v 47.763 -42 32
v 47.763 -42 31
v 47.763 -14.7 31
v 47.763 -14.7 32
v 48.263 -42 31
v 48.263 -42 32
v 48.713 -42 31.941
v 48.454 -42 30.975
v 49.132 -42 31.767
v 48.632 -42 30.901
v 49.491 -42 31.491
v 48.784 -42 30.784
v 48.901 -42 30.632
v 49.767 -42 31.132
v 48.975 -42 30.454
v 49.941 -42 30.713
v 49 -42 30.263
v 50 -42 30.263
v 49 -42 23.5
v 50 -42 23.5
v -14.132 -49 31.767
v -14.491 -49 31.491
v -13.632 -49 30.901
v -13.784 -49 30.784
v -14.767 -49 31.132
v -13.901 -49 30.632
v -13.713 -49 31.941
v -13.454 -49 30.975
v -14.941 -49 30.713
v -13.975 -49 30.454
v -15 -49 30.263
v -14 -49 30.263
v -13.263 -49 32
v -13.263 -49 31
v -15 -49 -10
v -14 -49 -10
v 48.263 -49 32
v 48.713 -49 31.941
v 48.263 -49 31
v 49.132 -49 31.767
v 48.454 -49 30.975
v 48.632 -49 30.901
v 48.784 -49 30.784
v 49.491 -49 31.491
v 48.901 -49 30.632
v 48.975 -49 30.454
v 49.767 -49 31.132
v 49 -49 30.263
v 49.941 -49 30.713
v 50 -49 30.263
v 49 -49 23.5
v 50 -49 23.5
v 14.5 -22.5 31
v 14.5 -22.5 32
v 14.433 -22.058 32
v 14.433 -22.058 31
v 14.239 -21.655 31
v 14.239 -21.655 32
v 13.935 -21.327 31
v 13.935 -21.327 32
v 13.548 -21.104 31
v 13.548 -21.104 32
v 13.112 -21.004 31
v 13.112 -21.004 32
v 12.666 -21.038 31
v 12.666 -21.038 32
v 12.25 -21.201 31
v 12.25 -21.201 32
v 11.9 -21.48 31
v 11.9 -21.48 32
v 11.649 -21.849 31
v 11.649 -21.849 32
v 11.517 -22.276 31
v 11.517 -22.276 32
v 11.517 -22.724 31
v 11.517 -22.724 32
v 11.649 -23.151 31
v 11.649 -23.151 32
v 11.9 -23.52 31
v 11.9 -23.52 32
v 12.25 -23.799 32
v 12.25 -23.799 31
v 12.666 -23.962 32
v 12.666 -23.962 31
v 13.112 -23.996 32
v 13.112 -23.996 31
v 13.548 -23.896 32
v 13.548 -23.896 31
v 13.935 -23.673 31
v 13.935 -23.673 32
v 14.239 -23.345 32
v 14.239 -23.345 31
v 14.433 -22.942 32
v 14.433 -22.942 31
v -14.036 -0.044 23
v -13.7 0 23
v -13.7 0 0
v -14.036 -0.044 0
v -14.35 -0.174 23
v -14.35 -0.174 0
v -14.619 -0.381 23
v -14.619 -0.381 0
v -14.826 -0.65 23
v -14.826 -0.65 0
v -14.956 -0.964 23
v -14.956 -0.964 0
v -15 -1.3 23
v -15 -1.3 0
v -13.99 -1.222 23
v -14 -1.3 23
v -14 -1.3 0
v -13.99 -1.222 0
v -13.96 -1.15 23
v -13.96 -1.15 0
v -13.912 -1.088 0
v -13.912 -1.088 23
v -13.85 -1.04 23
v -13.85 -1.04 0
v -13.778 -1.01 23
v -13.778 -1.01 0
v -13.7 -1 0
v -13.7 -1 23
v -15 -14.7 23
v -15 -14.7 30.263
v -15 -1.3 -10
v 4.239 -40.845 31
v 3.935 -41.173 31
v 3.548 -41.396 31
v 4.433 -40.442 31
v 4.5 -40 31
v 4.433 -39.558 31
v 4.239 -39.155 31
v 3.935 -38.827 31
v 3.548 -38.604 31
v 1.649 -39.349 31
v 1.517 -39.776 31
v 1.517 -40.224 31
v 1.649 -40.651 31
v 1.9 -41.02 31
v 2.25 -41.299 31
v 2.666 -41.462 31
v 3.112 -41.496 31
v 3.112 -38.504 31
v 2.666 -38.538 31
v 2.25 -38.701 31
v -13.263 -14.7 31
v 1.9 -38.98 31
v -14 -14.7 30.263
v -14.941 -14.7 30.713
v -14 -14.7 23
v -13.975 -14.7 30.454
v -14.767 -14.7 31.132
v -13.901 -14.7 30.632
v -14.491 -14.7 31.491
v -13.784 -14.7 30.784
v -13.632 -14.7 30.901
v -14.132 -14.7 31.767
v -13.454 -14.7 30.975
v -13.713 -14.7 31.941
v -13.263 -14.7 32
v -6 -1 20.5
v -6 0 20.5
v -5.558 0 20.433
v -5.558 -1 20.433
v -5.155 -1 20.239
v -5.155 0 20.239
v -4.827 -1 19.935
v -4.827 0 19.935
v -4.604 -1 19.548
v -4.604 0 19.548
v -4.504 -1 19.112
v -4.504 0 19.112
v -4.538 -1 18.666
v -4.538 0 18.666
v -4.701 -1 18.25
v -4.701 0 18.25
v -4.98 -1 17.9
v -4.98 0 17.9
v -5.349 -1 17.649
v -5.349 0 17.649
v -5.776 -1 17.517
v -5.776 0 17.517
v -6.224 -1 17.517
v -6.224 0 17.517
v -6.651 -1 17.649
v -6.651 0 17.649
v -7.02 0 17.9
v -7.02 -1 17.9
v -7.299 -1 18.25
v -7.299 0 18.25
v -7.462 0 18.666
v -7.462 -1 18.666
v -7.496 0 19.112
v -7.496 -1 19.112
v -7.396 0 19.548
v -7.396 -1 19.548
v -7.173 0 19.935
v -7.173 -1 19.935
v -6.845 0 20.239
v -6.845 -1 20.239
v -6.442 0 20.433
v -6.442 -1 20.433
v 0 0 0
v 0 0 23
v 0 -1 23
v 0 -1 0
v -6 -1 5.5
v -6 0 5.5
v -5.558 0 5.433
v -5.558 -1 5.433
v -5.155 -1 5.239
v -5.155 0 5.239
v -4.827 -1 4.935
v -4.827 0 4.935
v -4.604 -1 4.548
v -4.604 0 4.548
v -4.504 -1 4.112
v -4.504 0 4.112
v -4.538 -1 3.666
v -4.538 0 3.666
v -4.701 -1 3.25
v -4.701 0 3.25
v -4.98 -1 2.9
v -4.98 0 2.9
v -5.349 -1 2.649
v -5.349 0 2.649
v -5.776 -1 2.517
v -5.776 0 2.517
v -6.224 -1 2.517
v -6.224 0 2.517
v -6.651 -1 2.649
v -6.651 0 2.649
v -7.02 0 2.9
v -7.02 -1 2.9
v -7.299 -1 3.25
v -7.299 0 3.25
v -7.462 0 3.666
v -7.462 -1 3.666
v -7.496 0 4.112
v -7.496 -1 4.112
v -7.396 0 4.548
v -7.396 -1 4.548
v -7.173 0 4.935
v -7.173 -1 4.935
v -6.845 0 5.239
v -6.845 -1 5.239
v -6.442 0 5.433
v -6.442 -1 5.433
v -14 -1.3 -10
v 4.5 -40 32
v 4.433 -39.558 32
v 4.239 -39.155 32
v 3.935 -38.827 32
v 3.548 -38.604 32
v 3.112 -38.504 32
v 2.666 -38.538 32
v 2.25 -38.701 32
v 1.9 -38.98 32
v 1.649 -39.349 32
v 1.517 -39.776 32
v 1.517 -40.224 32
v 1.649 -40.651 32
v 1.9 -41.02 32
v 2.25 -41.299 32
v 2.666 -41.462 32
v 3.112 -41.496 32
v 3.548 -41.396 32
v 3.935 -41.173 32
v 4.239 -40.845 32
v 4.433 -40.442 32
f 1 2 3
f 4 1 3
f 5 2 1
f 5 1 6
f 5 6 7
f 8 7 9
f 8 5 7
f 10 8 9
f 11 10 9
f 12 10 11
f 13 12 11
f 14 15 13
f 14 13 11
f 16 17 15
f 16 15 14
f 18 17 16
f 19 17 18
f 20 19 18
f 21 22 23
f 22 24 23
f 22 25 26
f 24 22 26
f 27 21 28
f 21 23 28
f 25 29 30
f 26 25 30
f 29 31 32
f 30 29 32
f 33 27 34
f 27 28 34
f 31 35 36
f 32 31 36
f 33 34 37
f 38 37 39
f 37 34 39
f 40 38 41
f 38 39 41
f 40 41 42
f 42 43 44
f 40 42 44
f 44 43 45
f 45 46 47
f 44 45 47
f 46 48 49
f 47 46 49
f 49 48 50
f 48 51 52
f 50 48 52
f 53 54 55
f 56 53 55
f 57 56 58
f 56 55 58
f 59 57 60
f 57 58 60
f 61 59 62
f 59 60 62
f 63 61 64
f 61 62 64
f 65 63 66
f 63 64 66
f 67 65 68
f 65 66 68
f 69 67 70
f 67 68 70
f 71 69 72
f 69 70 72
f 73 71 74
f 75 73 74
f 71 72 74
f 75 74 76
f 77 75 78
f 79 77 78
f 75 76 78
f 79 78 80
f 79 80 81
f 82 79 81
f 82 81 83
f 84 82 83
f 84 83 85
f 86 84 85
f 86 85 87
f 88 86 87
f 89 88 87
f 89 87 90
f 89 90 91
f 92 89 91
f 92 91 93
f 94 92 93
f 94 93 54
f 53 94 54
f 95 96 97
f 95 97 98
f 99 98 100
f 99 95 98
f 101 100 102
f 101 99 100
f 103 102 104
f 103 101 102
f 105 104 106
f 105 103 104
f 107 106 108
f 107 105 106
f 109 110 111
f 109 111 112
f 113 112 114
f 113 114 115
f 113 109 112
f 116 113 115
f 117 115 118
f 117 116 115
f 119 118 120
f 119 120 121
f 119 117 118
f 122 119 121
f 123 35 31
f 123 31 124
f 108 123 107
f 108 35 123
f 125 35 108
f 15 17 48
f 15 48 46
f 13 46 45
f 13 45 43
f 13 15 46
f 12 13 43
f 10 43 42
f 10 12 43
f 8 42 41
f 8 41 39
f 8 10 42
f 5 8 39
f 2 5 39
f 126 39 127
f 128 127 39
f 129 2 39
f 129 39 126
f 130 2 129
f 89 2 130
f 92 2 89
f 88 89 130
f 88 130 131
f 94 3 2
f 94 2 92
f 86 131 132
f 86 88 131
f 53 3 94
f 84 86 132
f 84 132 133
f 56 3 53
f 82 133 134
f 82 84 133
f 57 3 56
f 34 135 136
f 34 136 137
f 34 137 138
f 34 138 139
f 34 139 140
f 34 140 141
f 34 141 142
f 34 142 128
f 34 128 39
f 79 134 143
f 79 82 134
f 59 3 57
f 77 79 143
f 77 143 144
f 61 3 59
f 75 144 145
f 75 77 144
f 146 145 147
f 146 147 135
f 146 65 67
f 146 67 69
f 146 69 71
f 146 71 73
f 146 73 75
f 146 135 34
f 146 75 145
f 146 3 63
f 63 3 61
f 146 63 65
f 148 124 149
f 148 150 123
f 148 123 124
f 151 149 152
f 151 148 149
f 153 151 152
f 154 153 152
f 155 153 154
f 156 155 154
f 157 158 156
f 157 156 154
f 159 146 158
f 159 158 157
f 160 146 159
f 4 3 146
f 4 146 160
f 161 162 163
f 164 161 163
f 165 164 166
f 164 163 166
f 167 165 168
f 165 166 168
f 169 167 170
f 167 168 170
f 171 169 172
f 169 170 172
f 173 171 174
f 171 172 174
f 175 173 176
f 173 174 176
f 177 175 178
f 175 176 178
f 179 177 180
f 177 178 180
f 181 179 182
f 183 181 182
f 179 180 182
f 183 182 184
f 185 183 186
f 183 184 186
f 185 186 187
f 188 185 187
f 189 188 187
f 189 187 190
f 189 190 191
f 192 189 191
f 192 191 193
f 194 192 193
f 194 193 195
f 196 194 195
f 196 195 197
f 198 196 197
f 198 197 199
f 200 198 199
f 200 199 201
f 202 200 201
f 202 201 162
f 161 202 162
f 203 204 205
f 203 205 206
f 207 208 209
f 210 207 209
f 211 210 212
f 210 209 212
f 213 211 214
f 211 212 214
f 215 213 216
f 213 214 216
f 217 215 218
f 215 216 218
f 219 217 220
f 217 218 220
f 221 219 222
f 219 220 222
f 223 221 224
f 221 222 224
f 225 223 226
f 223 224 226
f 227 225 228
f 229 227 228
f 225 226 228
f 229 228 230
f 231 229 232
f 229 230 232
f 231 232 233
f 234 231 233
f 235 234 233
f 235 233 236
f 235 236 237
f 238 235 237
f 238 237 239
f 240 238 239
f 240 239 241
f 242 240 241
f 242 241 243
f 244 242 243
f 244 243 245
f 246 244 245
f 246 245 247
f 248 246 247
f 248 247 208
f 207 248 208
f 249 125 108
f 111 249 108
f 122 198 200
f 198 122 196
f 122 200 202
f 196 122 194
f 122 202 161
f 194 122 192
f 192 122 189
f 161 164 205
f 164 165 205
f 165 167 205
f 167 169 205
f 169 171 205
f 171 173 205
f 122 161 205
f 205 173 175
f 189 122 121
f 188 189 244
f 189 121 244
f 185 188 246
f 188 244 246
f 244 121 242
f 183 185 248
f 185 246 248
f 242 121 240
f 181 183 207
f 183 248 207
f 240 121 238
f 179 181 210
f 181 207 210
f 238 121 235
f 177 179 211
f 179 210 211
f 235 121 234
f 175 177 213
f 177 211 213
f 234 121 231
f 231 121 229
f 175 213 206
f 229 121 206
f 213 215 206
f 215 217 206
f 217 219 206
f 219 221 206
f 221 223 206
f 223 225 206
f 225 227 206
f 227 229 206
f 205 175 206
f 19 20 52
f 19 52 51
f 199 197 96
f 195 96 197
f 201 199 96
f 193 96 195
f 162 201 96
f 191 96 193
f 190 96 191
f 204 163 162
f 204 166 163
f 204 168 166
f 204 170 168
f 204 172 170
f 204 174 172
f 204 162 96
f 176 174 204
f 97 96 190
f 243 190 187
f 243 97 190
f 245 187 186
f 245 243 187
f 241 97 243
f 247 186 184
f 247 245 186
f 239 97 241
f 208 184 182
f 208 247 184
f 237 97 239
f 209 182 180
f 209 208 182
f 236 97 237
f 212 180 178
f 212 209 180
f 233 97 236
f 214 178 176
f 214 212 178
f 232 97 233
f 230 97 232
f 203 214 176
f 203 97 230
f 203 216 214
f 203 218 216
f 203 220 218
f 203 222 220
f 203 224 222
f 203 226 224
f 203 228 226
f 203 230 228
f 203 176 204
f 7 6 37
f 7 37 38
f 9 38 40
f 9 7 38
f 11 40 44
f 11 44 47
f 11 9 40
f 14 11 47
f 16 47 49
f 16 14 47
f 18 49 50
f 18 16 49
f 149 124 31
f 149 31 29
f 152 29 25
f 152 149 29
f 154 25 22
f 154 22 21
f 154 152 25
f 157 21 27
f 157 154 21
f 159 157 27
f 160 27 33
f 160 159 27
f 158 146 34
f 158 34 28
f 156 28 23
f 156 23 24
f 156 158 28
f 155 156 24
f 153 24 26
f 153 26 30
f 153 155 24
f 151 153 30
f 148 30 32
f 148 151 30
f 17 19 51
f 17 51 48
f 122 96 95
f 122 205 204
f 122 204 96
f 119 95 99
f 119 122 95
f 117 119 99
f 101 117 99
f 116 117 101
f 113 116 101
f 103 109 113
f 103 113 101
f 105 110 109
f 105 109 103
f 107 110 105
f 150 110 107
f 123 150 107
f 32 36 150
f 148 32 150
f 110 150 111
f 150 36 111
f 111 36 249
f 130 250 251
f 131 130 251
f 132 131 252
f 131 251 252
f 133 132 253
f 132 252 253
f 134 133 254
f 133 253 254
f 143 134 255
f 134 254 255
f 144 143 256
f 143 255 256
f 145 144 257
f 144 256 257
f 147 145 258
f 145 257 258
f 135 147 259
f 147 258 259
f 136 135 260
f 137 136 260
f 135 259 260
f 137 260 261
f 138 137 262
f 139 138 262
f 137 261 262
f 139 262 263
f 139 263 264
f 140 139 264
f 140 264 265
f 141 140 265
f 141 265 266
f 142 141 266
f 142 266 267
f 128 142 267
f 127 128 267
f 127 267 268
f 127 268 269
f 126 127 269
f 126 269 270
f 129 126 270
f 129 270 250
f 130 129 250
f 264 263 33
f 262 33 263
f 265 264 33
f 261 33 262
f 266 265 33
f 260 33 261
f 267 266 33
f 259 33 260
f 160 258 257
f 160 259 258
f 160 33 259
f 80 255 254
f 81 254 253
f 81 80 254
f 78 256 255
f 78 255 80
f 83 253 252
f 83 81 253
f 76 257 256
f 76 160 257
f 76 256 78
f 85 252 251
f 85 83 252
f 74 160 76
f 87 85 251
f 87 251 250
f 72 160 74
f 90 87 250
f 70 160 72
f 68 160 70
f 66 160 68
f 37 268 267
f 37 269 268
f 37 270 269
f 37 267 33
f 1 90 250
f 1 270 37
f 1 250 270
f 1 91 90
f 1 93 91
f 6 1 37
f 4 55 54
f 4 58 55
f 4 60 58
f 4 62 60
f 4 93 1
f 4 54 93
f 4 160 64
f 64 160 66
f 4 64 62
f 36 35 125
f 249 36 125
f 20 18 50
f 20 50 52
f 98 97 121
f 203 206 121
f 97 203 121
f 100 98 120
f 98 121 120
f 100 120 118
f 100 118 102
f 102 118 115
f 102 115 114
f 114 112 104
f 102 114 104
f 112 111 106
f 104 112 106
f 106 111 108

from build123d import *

# Parameters (mm, degrees)
SKETCH1_W                     = 15
SKETCH1_H                     = 23
BASE_FLANGE1_DEPTH            = 1
EDGE_FLANGE1_STRIP_W          = 4.6
EDGE_FLANGE1_STRIP_H          = 1
EDGE_FLANGE1_STRIP_CUT_DEPTH  = 23
EDGE_FLANGE1_DEPTH            = 23
SKETCH10_W                    = 10
SKETCH10_H                    = 47.7
BOSS_EXTRUDE2_DEPTH           = 1
SKETCH15_W                    = 1
SKETCH15_H                    = 34.3
BOSS_EXTRUDE3_DEPTH           = 9
EDGE_FLANGE3_STRIP_W          = 5.4732
EDGE_FLANGE3_STRIP_H          = 1
EDGE_FLANGE3_STRIP_CUT_DEPTH  = 34.3
EDGE_FLANGE3_DEPTH            = 34.3
EDGE_FLANGE4_STRIP_W          = 5.4732
EDGE_FLANGE4_STRIP_H          = 1
EDGE_FLANGE4_STRIP_CUT_DEPTH  = 7
EDGE_FLANGE4_RELIEF_W         = 5.9732
EDGE_FLANGE4_RELIEF_H         = 1000
EDGE_FLANGE4_RELIEF_CUT_DEPTH = 1
EDGE_FLANGE4_DEPTH            = 7
SKETCH31_R                    = 1.5
CUT_EXTRUDE1_DEPTH            = 82.639451248
SKETCH32_R                    = 1.5
CUT_EXTRUDE2_DEPTH            = 10


# Sheet-metal steps are written as plain solids
with BuildPart() as part:
    # Sketch1 → Base-Flange1 (new body)
    with BuildSketch(Plane(origin=(0, 0, 0), x_dir=(1, 0, 0), z_dir=(0, 1, 0))):
        with Locations((-7.5, -11.5)):
            Rectangle(SKETCH1_W, SKETCH1_H)
    extrude(amount=-BASE_FLANGE1_DEPTH)

    # Edge-Flange1 strip (across the edge) → Edge-Flange1 strip cut (cut)
    with BuildSketch(Plane(origin=(-15, -1, 23), x_dir=(1, 0, 0), z_dir=(0, 0, -1))):
        with Locations((-1, -0.5)):
            Rectangle(EDGE_FLANGE1_STRIP_W, EDGE_FLANGE1_STRIP_H)
    extrude(amount=EDGE_FLANGE1_STRIP_CUT_DEPTH, mode=Mode.SUBTRACT)

    # Edge-Flange1 section (across the edge) → Edge-Flange1 (add)
    with BuildSketch(Plane(origin=(-15, -1, 23), x_dir=(1, 0, 0), z_dir=(0, 0, -1))):
        with BuildLine():
            Line((0, 0.3), (0, 48))
            Line((0, 48), (1, 48))
            Line((1, 48), (1, 0.3))
            ThreePointArc((1, 0.3), (1.087867966, 0.087867966), (1.3, 0))
            Line((1.3, 0), (1.3, -1))
            ThreePointArc((1.3, -1), (0.380761184, -0.619238816), (0, 0.3))
        make_face()
    extrude(amount=EDGE_FLANGE1_DEPTH)

    # Sketch10 → Boss-Extrude2 (add)
    with BuildSketch(Plane.ZY.offset(15)):
        with Locations((-5, -25.15)):
            Rectangle(SKETCH10_W, SKETCH10_H)
    extrude(amount=-BOSS_EXTRUDE2_DEPTH)

    # Sketch15 → Boss-Extrude3 (add)
    with BuildSketch(Plane.XY.offset(23)):
        with Locations((-14.5, -31.85)):
            Rectangle(SKETCH15_W, SKETCH15_H)
    extrude(amount=BOSS_EXTRUDE3_DEPTH)

    # Edge-Flange3 strip (across the edge) → Edge-Flange3 strip cut (cut)
    with BuildSketch(Plane(origin=(-14, -14.7, 32), x_dir=(0, 0, -1), z_dir=(0, -1, 0))):
        with Locations((-1, -0.5)):
            Rectangle(EDGE_FLANGE3_STRIP_W, EDGE_FLANGE3_STRIP_H)
    extrude(amount=EDGE_FLANGE3_STRIP_CUT_DEPTH, mode=Mode.SUBTRACT)

    # Edge-Flange3 section (across the edge) → Edge-Flange3 (add)
    with BuildSketch(Plane(origin=(-14, -14.7, 32), x_dir=(0, 0, -1), z_dir=(0, -1, 0))):
        with BuildLine():
            Line((0, 0.7366), (0, 64))
            Line((0, 64), (1, 64))
            Line((1, 64), (1, 0.7366))
            ThreePointArc((1, 0.7366), (1.215745145, 0.215745145), (1.7366, 0))
            Line((1.7366, 0), (1.7366, -1))
            ThreePointArc((1.7366, -1), (0.508638364, -0.491361636), (0, 0.7366))
        make_face()
    extrude(amount=EDGE_FLANGE3_DEPTH)

    # Edge-Flange4 strip (across the edge) → Edge-Flange4 strip cut (cut)
    with BuildSketch(Plane(origin=(50, -42, 31), x_dir=(-1, 0, 0), z_dir=(0, -1, 0))):
        with Locations((-1, -0.5)):
            Rectangle(EDGE_FLANGE4_STRIP_W, EDGE_FLANGE4_STRIP_H)
    extrude(amount=EDGE_FLANGE4_STRIP_CUT_DEPTH, mode=Mode.SUBTRACT)

    # Edge-Flange4 relief (on the sheet) → Edge-Flange4 relief cut (cut)
    with BuildSketch(Plane(origin=(48.2634, -42, 31), x_dir=(-1, 0, 0), z_dir=(0, 0, -1))):
        with Locations((-2.4866, 500)):
            Rectangle(EDGE_FLANGE4_RELIEF_W, EDGE_FLANGE4_RELIEF_H)
    extrude(amount=-EDGE_FLANGE4_RELIEF_CUT_DEPTH, mode=Mode.SUBTRACT)

    # Edge-Flange4 section (across the edge) → Edge-Flange4 (add)
    with BuildSketch(Plane(origin=(50, -42, 31), x_dir=(-1, 0, 0), z_dir=(0, -1, 0))):
        with BuildLine():
            Line((0, 0.7366), (0, 7.5))
            Line((0, 7.5), (1, 7.5))
            Line((1, 7.5), (1, 0.7366))
            ThreePointArc((1, 0.7366), (1.215745145, 0.215745145), (1.7366, 0))
            Line((1.7366, 0), (1.7366, -1))
            ThreePointArc((1.7366, -1), (0.508638364, -0.491361636), (0, 0.7366))
        make_face()
    extrude(amount=EDGE_FLANGE4_DEPTH)

    # Sketch31 → Cut-Extrude1 (cut, through all)
    with BuildSketch(Plane.XY.offset(32)):
        with Locations((3, -40)):
            Circle(SKETCH31_R)
        with Locations((13, -22.5)):
            Circle(SKETCH31_R)
    extrude(amount=-CUT_EXTRUDE1_DEPTH, mode=Mode.SUBTRACT)

    # Sketch32 → Cut-Extrude2 (cut)
    with BuildSketch(Plane(origin=(0, 0, 0), x_dir=(1, 0, 0), z_dir=(0, 1, 0))):
        with Locations(Location((-6, -4, 0), (0, 0, 270))):
            Circle(SKETCH32_R)
        with Locations(Location((-6, -19, 0), (0, 0, 270))):
            Circle(SKETCH32_R)
    extrude(amount=-CUT_EXTRUDE2_DEPTH, mode=Mode.SUBTRACT)


solid = part.part
